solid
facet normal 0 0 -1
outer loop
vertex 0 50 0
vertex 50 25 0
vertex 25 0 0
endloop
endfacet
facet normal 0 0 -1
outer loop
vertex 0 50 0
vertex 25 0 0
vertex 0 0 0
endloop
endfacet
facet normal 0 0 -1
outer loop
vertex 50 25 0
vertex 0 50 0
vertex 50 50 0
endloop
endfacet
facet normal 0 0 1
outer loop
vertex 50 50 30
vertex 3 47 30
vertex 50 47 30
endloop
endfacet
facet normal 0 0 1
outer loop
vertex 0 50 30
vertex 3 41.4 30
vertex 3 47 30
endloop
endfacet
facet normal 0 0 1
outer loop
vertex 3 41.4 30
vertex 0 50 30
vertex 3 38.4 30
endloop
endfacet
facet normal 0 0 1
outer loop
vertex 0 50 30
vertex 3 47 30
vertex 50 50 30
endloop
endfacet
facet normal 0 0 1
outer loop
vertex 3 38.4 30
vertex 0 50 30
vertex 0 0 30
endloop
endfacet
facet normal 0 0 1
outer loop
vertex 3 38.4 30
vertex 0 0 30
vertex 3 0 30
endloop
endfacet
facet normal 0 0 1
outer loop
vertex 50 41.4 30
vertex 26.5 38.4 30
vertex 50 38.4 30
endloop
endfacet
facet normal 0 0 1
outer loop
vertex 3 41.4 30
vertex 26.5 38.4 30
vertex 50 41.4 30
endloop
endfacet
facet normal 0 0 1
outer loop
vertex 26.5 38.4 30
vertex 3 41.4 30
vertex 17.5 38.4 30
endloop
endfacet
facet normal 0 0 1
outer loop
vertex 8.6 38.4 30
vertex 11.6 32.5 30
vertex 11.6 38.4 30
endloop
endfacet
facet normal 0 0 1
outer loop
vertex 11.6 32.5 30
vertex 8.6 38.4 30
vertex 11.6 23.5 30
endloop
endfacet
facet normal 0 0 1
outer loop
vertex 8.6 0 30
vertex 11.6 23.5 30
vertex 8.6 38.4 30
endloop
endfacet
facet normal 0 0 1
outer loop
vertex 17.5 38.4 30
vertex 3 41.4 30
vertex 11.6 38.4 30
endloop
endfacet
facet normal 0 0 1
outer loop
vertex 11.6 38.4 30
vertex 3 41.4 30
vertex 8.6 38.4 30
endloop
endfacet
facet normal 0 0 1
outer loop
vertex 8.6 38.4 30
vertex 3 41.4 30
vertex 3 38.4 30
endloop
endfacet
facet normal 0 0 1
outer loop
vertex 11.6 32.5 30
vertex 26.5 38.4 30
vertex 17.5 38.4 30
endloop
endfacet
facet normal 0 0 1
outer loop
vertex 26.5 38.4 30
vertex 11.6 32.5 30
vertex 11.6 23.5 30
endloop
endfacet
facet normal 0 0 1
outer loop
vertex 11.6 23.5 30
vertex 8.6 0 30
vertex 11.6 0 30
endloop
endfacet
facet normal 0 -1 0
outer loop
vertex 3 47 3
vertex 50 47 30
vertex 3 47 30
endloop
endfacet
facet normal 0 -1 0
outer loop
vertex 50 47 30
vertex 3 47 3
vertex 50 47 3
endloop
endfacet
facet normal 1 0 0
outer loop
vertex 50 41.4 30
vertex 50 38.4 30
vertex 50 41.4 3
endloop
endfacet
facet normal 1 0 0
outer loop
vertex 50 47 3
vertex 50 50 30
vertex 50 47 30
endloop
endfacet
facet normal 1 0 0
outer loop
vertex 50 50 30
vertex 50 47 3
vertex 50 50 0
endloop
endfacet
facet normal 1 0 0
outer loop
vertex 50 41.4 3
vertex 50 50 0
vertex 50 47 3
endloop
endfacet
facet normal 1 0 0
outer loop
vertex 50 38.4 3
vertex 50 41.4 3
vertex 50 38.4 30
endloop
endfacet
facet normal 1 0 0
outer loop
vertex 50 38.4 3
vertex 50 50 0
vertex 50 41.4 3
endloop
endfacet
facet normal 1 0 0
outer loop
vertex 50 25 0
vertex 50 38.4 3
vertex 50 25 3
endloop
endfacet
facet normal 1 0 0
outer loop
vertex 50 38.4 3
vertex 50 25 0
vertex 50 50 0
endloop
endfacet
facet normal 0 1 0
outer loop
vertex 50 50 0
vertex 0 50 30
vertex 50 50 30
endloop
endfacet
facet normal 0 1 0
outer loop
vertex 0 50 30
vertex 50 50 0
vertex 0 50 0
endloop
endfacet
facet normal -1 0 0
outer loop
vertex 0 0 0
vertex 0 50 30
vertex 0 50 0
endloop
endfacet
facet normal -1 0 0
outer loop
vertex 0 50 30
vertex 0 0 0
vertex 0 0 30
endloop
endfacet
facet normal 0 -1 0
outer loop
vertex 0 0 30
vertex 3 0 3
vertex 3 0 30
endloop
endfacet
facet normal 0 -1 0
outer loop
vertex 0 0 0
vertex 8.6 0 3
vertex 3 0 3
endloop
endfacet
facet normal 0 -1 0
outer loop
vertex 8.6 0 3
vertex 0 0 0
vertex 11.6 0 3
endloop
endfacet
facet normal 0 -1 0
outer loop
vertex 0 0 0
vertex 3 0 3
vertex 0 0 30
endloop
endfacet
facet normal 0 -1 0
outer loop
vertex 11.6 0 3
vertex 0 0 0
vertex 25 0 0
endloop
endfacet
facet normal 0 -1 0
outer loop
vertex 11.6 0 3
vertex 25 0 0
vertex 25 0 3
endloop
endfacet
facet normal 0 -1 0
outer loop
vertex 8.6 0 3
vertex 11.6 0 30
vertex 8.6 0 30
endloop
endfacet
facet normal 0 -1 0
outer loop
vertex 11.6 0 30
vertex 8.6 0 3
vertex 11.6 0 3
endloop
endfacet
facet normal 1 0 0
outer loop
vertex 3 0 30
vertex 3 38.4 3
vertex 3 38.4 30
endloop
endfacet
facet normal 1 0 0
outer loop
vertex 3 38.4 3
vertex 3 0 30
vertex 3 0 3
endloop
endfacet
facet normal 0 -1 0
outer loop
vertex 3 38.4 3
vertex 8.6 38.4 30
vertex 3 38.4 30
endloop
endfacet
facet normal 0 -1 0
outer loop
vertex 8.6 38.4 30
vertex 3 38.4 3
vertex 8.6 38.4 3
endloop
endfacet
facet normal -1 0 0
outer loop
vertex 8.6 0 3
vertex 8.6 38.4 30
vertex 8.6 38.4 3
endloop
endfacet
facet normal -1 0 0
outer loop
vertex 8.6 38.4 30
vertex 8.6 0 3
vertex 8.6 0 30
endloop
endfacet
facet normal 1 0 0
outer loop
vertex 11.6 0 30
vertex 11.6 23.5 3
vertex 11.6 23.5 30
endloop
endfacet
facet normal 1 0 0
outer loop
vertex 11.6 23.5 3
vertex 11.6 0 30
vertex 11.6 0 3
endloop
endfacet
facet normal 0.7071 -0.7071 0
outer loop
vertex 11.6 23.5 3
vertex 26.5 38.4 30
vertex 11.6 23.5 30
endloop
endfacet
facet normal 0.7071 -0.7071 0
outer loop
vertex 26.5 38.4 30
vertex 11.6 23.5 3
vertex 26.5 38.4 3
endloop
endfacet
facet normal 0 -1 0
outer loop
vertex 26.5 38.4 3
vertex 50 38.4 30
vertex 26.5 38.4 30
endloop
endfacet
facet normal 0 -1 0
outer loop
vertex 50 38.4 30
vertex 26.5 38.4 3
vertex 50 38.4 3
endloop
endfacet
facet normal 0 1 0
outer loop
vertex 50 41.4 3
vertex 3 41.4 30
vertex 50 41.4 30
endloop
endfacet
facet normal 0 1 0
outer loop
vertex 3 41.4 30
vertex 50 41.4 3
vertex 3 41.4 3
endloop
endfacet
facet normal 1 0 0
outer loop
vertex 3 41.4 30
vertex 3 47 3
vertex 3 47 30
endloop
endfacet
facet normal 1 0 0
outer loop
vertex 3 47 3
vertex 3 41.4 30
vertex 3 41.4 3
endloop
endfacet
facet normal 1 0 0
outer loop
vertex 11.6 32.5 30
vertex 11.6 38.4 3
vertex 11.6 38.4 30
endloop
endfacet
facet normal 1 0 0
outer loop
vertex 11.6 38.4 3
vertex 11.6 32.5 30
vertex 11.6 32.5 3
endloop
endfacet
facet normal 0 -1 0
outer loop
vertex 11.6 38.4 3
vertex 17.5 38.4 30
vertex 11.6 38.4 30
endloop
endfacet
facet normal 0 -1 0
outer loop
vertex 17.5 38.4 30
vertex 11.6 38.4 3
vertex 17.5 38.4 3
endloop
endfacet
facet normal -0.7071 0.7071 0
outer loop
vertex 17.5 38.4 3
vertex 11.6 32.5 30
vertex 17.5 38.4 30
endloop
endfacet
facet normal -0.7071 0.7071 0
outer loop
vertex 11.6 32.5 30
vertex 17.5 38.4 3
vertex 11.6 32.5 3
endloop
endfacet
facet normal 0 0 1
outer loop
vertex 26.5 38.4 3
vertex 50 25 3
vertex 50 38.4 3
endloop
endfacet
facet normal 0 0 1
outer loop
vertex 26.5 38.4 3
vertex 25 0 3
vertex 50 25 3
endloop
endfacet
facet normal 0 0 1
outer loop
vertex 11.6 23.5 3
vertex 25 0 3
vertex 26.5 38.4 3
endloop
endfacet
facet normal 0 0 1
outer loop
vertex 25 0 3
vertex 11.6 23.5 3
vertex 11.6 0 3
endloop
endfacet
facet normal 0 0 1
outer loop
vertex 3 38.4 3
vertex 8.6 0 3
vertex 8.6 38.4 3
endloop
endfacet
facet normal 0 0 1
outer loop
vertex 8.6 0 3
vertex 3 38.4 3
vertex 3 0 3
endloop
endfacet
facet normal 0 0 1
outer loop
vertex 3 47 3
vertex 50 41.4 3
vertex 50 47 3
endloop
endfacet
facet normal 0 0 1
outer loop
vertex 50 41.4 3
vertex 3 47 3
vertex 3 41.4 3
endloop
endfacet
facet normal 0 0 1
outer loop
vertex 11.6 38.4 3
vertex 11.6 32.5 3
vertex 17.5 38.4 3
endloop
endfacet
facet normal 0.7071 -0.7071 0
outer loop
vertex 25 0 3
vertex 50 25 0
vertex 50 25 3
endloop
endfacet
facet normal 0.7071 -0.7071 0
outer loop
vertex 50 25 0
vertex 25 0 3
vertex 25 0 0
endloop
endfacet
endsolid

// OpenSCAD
// outher length from the corner into the plates' center
length = 50;

// in mm, increases the slot width for your plates
tolerance = 0.6;

// wudth along the edge
width = 30;

// two in case you use different plates for the sides
plate_a_thickness = 5;
plate_b_thickness = 5;

clip_wall = 3;

union() {

    linear_extrude(width) union() {
        // outer side
        x = length;
        y = length;
        w = clip_wall;
        x1 = x - w;
        y1 = y - w;
        polygon([
            [0, 0], [0, x], [x, y],
            [x, y1], [w, y1], [w, 0]
        ]);
        // inner side
        a = w + plate_a_thickness + tolerance;
        b = length - w - plate_b_thickness - tolerance;
        polygon([
            [a, 0], [a, b], [length, b], [ length, b - w],
            [a + w, b - w], [a + w, 0]
        ]);
    
        polygon([
            [0, b - w], [a + w, b - w], [a + w, b], [0, b]
        ]);
        
        k = 3 * w;
        m = length /2 - k/2;
        polygon([
            [a, m], [a, m + k], [m, b], [m + k, b]
        ]); 
    }
    r = 0.5;
    linear_extrude(clip_wall)
        polygon([
            [0, 0], [0, length], [length, length], [length, length * (1-r)], [length * r, 00]
     ]);
 }
